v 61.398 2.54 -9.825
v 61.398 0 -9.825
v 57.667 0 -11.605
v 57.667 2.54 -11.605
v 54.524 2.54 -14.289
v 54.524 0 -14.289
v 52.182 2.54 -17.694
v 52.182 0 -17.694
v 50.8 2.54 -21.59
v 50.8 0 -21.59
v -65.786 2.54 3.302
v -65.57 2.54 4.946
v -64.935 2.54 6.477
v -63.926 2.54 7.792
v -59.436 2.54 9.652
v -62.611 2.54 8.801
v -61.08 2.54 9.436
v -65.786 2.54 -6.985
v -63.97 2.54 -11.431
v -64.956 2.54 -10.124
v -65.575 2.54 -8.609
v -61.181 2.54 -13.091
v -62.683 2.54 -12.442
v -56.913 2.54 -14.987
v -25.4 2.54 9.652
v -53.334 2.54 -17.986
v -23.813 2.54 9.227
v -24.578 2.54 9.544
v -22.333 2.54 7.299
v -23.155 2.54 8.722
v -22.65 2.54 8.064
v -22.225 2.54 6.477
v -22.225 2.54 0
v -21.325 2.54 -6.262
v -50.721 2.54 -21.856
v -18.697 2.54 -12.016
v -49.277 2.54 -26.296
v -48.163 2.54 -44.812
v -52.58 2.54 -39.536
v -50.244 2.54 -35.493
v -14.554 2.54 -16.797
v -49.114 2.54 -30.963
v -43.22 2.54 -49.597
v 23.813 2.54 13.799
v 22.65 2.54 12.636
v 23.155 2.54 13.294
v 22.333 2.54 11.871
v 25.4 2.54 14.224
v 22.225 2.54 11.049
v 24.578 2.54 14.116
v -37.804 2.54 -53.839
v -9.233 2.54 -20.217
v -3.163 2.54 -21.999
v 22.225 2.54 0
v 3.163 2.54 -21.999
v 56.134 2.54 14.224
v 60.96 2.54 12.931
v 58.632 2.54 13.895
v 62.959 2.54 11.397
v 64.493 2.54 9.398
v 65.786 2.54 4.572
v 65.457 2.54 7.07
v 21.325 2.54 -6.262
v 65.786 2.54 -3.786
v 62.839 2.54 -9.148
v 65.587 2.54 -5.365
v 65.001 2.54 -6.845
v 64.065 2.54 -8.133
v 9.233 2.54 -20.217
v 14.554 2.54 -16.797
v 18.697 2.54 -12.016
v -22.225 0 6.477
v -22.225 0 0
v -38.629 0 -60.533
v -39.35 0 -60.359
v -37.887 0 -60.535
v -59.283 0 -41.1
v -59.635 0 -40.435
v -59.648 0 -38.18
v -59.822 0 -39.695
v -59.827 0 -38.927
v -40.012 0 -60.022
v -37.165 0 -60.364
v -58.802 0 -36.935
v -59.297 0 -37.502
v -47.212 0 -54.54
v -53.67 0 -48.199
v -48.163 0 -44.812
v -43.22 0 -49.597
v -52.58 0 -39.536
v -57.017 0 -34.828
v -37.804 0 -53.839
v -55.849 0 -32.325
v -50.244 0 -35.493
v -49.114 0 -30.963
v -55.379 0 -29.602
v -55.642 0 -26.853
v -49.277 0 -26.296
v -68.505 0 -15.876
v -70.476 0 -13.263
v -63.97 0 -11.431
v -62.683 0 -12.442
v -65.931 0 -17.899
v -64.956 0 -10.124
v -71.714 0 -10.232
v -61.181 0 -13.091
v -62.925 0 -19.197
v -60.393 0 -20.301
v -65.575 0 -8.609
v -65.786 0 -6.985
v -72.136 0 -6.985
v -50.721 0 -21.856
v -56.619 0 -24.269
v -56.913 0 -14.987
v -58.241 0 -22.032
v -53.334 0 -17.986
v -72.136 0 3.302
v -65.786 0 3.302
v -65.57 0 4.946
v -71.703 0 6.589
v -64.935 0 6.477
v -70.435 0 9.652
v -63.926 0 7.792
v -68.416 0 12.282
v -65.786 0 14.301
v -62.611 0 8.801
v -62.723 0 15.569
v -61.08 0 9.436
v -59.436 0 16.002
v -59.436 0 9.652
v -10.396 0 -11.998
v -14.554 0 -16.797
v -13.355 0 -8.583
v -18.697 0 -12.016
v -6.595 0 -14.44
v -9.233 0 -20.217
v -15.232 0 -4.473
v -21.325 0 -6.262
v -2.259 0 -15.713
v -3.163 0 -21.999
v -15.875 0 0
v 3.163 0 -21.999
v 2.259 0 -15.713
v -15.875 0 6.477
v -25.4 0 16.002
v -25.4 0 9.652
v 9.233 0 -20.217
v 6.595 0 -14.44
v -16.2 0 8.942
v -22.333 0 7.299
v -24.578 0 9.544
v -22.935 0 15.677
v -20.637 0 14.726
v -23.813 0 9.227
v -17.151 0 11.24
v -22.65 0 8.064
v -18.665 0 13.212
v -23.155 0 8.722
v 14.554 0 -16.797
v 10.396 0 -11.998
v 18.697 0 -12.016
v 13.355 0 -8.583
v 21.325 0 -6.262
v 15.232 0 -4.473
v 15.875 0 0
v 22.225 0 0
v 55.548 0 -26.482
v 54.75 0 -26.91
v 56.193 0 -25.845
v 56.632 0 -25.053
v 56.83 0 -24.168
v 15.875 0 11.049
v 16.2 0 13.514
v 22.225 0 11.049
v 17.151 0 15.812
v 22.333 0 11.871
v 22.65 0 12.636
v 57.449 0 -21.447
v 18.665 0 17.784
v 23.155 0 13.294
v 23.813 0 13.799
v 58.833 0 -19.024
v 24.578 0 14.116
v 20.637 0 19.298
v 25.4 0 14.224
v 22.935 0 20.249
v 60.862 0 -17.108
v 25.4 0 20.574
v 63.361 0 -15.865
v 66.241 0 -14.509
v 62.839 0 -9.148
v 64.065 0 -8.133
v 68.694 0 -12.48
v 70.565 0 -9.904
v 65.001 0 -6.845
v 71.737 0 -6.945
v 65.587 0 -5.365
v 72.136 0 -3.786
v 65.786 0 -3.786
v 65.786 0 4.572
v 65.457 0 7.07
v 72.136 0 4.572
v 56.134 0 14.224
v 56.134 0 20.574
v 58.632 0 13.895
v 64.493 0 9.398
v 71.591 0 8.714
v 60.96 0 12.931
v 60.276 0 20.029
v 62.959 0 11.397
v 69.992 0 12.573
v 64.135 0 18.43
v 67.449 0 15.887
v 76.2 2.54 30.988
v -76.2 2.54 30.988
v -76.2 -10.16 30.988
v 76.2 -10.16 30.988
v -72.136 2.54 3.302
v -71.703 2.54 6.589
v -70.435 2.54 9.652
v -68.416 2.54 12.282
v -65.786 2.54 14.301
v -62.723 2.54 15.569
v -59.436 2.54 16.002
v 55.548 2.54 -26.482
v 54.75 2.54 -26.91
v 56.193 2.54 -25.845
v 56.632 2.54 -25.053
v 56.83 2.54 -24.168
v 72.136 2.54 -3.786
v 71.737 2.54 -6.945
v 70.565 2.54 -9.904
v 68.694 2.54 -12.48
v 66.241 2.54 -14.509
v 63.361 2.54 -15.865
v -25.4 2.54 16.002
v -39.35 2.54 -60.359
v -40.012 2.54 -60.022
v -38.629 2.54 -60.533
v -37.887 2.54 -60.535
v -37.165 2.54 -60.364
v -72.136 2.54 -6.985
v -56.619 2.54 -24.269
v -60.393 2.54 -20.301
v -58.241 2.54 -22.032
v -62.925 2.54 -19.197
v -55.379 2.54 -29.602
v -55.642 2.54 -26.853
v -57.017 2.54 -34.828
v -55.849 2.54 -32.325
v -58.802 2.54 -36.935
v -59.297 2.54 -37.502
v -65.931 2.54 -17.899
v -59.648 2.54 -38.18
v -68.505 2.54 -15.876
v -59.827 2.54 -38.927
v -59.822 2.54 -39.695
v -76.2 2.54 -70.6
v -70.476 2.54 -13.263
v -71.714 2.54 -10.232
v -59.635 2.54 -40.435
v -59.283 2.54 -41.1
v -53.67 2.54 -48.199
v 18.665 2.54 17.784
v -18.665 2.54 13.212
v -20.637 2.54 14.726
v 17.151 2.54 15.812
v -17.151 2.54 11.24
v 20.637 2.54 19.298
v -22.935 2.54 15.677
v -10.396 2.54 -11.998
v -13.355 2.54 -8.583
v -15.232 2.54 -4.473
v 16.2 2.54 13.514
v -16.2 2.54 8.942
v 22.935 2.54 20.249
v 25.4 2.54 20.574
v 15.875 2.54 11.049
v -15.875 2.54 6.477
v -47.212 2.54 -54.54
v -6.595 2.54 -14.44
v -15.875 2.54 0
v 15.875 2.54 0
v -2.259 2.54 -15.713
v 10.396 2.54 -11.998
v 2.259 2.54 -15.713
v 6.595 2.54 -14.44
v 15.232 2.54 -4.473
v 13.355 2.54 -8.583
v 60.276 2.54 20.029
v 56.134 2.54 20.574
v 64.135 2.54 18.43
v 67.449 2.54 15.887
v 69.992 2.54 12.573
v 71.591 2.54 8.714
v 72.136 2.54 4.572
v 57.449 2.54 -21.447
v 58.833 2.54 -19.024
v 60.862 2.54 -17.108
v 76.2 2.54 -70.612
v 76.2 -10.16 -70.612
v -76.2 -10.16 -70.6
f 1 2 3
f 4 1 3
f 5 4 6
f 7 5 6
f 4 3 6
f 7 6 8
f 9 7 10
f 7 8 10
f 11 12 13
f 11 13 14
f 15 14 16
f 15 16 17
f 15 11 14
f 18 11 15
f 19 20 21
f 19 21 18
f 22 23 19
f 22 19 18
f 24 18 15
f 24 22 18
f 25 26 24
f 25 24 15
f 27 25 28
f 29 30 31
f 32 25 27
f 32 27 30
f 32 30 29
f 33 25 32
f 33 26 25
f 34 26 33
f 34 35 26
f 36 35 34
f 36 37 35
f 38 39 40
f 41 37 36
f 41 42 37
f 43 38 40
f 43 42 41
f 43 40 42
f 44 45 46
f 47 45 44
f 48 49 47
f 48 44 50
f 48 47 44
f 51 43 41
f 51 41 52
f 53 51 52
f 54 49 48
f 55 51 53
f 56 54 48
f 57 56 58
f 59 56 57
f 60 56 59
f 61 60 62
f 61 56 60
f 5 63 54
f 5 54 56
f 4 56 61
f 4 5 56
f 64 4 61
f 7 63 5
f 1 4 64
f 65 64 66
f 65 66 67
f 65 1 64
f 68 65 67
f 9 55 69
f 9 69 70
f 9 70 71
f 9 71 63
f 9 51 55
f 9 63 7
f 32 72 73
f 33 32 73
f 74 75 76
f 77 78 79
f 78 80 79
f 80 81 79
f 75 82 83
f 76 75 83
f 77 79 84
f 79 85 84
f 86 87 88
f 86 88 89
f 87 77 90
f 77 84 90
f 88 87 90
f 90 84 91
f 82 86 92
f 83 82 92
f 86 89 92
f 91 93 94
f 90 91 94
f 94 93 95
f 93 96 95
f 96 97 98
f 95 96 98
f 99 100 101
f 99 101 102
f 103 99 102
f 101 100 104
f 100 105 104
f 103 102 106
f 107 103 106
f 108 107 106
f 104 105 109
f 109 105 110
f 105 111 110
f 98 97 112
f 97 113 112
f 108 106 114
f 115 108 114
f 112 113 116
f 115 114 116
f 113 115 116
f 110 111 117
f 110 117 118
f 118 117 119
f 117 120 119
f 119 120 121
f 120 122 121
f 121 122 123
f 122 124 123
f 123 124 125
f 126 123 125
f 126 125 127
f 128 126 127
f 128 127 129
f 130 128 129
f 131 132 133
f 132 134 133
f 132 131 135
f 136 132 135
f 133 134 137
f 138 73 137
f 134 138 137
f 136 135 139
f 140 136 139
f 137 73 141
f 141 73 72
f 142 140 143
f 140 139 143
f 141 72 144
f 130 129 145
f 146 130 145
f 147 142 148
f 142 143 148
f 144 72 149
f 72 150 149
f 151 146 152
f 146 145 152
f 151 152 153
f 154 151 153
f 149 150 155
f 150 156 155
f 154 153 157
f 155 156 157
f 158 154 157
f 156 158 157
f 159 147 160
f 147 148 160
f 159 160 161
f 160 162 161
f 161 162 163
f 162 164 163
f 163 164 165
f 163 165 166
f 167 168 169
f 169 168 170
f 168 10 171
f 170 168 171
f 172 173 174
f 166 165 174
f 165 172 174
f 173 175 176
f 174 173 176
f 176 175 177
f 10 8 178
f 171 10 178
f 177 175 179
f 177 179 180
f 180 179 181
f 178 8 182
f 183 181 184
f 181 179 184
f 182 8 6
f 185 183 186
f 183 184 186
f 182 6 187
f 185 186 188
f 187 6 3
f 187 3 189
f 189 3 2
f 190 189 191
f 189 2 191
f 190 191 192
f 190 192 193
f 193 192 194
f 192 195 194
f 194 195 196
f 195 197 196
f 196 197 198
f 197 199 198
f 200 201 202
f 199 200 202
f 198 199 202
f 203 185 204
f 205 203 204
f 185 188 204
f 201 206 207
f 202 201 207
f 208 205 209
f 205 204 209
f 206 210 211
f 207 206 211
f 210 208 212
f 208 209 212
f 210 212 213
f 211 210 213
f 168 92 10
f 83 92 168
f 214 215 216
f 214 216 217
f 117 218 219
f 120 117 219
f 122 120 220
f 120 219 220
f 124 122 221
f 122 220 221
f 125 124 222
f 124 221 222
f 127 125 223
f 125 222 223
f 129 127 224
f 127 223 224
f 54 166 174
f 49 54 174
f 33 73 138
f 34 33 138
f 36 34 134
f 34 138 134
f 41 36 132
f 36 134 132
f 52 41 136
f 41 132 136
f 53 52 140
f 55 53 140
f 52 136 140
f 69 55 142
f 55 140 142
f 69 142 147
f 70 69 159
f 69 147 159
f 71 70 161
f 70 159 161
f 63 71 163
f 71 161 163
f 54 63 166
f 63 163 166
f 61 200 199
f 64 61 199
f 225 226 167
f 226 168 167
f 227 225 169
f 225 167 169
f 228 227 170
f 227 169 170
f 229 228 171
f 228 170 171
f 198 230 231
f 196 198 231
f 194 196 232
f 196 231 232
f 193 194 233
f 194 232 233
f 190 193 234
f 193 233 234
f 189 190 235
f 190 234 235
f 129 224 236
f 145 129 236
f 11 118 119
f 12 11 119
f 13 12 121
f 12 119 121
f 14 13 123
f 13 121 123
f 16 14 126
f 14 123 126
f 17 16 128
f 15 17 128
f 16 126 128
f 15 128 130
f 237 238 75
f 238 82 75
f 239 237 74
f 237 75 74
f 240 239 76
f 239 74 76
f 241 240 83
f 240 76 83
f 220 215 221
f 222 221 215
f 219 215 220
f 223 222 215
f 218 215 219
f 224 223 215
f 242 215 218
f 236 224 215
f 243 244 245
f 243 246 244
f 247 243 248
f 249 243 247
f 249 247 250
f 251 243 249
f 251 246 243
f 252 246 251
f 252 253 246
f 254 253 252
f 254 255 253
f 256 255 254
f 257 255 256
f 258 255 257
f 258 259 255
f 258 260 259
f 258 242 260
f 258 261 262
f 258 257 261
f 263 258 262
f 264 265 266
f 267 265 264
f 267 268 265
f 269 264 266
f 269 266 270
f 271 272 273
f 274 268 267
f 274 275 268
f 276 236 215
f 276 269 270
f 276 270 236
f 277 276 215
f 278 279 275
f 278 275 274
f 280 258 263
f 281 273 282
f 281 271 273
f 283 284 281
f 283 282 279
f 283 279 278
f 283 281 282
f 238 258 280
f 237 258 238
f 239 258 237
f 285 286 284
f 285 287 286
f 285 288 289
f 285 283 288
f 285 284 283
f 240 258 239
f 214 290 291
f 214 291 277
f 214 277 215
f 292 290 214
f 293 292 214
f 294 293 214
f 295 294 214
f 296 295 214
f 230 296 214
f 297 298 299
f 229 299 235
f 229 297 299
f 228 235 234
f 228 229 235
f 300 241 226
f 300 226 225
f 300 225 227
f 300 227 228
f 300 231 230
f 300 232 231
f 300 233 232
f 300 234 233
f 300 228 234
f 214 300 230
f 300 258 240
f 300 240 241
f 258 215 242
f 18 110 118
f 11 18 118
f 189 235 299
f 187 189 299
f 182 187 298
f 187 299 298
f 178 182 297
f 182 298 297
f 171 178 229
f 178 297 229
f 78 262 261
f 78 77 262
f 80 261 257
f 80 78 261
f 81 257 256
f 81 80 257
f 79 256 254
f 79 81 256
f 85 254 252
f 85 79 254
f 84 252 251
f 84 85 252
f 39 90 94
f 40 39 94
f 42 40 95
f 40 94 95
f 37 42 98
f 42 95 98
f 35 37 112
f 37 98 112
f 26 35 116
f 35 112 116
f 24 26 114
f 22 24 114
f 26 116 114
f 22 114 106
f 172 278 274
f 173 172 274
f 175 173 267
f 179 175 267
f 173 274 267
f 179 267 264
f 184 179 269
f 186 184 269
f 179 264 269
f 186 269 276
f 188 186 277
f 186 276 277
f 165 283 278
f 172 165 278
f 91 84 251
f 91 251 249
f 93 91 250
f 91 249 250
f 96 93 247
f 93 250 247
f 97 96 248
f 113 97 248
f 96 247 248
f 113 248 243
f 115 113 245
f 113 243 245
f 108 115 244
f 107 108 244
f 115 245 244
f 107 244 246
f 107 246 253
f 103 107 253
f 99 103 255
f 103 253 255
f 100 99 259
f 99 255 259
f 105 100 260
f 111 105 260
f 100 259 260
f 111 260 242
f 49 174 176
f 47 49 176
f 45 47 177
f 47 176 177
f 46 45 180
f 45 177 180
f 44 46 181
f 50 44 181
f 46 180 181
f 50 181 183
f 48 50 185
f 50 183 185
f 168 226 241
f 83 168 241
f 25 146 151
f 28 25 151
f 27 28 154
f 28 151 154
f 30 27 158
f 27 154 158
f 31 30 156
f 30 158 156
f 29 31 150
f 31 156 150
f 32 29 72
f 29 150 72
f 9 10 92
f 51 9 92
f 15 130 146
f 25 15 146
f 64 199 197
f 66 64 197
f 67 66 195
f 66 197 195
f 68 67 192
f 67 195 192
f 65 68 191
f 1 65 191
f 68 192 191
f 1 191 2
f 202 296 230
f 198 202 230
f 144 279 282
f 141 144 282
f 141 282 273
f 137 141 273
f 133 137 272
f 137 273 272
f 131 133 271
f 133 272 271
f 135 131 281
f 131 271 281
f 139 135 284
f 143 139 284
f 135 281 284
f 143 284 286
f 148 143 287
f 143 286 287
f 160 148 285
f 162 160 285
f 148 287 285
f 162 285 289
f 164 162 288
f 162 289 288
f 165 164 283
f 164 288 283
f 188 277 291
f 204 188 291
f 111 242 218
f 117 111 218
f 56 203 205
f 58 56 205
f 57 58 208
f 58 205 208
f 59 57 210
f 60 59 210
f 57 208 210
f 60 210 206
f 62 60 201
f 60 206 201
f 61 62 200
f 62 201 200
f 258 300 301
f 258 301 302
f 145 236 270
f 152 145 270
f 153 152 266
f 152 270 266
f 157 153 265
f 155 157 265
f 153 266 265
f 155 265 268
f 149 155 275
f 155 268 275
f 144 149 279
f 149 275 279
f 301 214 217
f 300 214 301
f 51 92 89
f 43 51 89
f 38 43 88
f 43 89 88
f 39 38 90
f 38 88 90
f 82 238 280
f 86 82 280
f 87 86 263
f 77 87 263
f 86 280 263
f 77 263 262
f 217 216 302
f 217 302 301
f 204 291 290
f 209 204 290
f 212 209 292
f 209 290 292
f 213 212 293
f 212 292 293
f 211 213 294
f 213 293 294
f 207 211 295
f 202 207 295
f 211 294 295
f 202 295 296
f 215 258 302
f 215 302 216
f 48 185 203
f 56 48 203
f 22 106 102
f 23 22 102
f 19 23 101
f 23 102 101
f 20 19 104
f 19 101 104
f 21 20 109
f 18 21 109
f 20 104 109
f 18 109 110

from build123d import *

# Parameters (mm, degrees)
BOSS_EXTRUDE1_DEPTH = 2.54
BOSS_EXTRUDE2_DEPTH = 10.16
BOSS_EXTRUDE4_DEPTH = 2.54
FILLET1_R           = 3.175
FILLET2_R           = 3.175
FILLET3_R           = 3.175


with BuildPart() as part:
    # Sketch1 → Boss-Extrude1 (new body)
    with BuildSketch(Plane(origin=(0, 0, 0), x_dir=(1, 0, 0), z_dir=(0, 1, 0))):
        with BuildLine():
            Line((-59.436, -9.652), (-25.4, -9.652))
            ThreePointArc((-25.4, -9.652), (-23.15493597, -8.72206403), (-22.225, -6.477))
            Line((-22.225, -6.477), (-22.225, 0))
            ThreePointArc((-22.225, 0), (0, 22.225), (22.225, 0))
            Line((22.225, 0), (22.225, -11.049))
            ThreePointArc((22.225, -11.049), (23.15493597, -13.29406403), (25.4, -14.224))
            Line((25.4, -14.224), (56.134, -14.224))
            ThreePointArc((56.134, -14.224), (62.958994652, -11.396994652), (65.786, -4.572))
            Line((65.786, -4.572), (65.786, 3.786270628))
            ThreePointArc((65.786, 3.786270628), (64.573284533, 7.518670343), (61.398344054, 9.825451517))
            ThreePointArc((61.398344054, 9.825451517), (54.523861552, 14.288596243), (50.799961303, 21.590016478))
            Line((50.799961303, 21.590016478), (-37.803944764, 53.839200926))
            ThreePointArc((-37.803944764, 53.839200926), (-45.754351941, 47.268774836), (-52.580093852, 39.536458193))
            ThreePointArc((-52.580093852, 39.536458193), (-49.843866059, 24.02540152), (-61.180505495, 13.091032404))
            ThreePointArc((-61.180505495, 13.091032404), (-64.505522161, 10.809293437), (-65.786, 6.98536286))
            Line((-65.786, 6.98536286), (-65.786, -3.302))
            ThreePointArc((-65.786, -3.302), (-63.926128061, -7.792128061), (-59.436, -9.652))
        make_face()
    extrude(amount=BOSS_EXTRUDE1_DEPTH)

    # Sketch2 → Boss-Extrude2 (add)
    with BuildSketch(Plane.XZ):
        Polygon((-76.199999672, 30.988), (-76.199999672, -70.600237501), (76.199999874, -70.612), (76.200000328, 30.988), align=None)
    extrude(amount=BOSS_EXTRUDE2_DEPTH)

    # Sketch9 → Boss-Extrude4 (add)
    with BuildSketch(Plane(origin=(0, 2.54, 0), x_dir=(1, 0, 0), z_dir=(0, 1, 0))):
        Polygon((76.200000328, -30.988), (76.199999874, 70.612), (-76.199999672, 70.600237501), (-76.199999672, -30.988), align=None)
        with BuildLine():
            Line((15.875, 0), (15.875, -11.049))
            ThreePointArc((15.875, -11.049), (18.664807909, -17.784192091), (25.4, -20.574))
            Line((25.4, -20.574), (56.134, -20.574))
            ThreePointArc((56.134, -20.574), (67.449122713, -15.887122713), (72.136, -4.572))
            Line((72.136, -4.572), (72.136, 3.786270628))
            ThreePointArc((72.136, 3.786270628), (69.710569066, 11.251070057), (63.360688108, 15.864632407))
            ThreePointArc((63.360688108, 15.864632407), (58.26569903, 19.828002779), (56.883535343, 26.133305464))
            Line((56.883535343, 26.133305464), (-38.653299329, 60.905869561))
            ThreePointArc((-38.653299329, 60.905869561), (-51.084372013, 50.931222566), (-61.021650194, 38.47025739))
            ThreePointArc((-61.021650194, 38.47025739), (-55.422413128, 28.186543533), (-62.925010989, 19.196701948))
            ThreePointArc((-62.925010989, 19.196701948), (-69.575044323, 14.633224013), (-72.136, 6.98536286))
            Line((-72.136, 6.98536286), (-72.136, -3.302))
            ThreePointArc((-72.136, -3.302), (-68.416256121, -12.282256121), (-59.436, -16.002))
            Line((-59.436, -16.002), (-25.4, -16.002))
            ThreePointArc((-25.4, -16.002), (-18.664807909, -13.212192091), (-15.875, -6.477))
            Line((-15.875, -6.477), (-15.875, 0))
            ThreePointArc((-15.875, 0), (0, 15.875), (15.875, 0))
        make_face(mode=Mode.SUBTRACT)
    extrude(amount=-BOSS_EXTRUDE4_DEPTH)

    # Fillet1
    fillet1_edges = [part.edges().sort_by_distance(p)[0] for p in [
        (-38.653299329, 1.27, -60.905869561),
    ]]
    fillet(fillet1_edges, radius=FILLET1_R)

    # Fillet2
    fillet2_edges = [part.edges().sort_by_distance(p)[0] for p in [
        (56.883535343, 1.27, -26.133305464),
    ]]
    fillet(fillet2_edges, radius=FILLET2_R)

    # Fillet3
    fillet3_edges = [part.edges().sort_by_distance(p)[0] for p in [
        (-61.021650194, 1.27, -38.47025739),
    ]]
    fillet(fillet3_edges, radius=FILLET3_R)


solid = part.part
